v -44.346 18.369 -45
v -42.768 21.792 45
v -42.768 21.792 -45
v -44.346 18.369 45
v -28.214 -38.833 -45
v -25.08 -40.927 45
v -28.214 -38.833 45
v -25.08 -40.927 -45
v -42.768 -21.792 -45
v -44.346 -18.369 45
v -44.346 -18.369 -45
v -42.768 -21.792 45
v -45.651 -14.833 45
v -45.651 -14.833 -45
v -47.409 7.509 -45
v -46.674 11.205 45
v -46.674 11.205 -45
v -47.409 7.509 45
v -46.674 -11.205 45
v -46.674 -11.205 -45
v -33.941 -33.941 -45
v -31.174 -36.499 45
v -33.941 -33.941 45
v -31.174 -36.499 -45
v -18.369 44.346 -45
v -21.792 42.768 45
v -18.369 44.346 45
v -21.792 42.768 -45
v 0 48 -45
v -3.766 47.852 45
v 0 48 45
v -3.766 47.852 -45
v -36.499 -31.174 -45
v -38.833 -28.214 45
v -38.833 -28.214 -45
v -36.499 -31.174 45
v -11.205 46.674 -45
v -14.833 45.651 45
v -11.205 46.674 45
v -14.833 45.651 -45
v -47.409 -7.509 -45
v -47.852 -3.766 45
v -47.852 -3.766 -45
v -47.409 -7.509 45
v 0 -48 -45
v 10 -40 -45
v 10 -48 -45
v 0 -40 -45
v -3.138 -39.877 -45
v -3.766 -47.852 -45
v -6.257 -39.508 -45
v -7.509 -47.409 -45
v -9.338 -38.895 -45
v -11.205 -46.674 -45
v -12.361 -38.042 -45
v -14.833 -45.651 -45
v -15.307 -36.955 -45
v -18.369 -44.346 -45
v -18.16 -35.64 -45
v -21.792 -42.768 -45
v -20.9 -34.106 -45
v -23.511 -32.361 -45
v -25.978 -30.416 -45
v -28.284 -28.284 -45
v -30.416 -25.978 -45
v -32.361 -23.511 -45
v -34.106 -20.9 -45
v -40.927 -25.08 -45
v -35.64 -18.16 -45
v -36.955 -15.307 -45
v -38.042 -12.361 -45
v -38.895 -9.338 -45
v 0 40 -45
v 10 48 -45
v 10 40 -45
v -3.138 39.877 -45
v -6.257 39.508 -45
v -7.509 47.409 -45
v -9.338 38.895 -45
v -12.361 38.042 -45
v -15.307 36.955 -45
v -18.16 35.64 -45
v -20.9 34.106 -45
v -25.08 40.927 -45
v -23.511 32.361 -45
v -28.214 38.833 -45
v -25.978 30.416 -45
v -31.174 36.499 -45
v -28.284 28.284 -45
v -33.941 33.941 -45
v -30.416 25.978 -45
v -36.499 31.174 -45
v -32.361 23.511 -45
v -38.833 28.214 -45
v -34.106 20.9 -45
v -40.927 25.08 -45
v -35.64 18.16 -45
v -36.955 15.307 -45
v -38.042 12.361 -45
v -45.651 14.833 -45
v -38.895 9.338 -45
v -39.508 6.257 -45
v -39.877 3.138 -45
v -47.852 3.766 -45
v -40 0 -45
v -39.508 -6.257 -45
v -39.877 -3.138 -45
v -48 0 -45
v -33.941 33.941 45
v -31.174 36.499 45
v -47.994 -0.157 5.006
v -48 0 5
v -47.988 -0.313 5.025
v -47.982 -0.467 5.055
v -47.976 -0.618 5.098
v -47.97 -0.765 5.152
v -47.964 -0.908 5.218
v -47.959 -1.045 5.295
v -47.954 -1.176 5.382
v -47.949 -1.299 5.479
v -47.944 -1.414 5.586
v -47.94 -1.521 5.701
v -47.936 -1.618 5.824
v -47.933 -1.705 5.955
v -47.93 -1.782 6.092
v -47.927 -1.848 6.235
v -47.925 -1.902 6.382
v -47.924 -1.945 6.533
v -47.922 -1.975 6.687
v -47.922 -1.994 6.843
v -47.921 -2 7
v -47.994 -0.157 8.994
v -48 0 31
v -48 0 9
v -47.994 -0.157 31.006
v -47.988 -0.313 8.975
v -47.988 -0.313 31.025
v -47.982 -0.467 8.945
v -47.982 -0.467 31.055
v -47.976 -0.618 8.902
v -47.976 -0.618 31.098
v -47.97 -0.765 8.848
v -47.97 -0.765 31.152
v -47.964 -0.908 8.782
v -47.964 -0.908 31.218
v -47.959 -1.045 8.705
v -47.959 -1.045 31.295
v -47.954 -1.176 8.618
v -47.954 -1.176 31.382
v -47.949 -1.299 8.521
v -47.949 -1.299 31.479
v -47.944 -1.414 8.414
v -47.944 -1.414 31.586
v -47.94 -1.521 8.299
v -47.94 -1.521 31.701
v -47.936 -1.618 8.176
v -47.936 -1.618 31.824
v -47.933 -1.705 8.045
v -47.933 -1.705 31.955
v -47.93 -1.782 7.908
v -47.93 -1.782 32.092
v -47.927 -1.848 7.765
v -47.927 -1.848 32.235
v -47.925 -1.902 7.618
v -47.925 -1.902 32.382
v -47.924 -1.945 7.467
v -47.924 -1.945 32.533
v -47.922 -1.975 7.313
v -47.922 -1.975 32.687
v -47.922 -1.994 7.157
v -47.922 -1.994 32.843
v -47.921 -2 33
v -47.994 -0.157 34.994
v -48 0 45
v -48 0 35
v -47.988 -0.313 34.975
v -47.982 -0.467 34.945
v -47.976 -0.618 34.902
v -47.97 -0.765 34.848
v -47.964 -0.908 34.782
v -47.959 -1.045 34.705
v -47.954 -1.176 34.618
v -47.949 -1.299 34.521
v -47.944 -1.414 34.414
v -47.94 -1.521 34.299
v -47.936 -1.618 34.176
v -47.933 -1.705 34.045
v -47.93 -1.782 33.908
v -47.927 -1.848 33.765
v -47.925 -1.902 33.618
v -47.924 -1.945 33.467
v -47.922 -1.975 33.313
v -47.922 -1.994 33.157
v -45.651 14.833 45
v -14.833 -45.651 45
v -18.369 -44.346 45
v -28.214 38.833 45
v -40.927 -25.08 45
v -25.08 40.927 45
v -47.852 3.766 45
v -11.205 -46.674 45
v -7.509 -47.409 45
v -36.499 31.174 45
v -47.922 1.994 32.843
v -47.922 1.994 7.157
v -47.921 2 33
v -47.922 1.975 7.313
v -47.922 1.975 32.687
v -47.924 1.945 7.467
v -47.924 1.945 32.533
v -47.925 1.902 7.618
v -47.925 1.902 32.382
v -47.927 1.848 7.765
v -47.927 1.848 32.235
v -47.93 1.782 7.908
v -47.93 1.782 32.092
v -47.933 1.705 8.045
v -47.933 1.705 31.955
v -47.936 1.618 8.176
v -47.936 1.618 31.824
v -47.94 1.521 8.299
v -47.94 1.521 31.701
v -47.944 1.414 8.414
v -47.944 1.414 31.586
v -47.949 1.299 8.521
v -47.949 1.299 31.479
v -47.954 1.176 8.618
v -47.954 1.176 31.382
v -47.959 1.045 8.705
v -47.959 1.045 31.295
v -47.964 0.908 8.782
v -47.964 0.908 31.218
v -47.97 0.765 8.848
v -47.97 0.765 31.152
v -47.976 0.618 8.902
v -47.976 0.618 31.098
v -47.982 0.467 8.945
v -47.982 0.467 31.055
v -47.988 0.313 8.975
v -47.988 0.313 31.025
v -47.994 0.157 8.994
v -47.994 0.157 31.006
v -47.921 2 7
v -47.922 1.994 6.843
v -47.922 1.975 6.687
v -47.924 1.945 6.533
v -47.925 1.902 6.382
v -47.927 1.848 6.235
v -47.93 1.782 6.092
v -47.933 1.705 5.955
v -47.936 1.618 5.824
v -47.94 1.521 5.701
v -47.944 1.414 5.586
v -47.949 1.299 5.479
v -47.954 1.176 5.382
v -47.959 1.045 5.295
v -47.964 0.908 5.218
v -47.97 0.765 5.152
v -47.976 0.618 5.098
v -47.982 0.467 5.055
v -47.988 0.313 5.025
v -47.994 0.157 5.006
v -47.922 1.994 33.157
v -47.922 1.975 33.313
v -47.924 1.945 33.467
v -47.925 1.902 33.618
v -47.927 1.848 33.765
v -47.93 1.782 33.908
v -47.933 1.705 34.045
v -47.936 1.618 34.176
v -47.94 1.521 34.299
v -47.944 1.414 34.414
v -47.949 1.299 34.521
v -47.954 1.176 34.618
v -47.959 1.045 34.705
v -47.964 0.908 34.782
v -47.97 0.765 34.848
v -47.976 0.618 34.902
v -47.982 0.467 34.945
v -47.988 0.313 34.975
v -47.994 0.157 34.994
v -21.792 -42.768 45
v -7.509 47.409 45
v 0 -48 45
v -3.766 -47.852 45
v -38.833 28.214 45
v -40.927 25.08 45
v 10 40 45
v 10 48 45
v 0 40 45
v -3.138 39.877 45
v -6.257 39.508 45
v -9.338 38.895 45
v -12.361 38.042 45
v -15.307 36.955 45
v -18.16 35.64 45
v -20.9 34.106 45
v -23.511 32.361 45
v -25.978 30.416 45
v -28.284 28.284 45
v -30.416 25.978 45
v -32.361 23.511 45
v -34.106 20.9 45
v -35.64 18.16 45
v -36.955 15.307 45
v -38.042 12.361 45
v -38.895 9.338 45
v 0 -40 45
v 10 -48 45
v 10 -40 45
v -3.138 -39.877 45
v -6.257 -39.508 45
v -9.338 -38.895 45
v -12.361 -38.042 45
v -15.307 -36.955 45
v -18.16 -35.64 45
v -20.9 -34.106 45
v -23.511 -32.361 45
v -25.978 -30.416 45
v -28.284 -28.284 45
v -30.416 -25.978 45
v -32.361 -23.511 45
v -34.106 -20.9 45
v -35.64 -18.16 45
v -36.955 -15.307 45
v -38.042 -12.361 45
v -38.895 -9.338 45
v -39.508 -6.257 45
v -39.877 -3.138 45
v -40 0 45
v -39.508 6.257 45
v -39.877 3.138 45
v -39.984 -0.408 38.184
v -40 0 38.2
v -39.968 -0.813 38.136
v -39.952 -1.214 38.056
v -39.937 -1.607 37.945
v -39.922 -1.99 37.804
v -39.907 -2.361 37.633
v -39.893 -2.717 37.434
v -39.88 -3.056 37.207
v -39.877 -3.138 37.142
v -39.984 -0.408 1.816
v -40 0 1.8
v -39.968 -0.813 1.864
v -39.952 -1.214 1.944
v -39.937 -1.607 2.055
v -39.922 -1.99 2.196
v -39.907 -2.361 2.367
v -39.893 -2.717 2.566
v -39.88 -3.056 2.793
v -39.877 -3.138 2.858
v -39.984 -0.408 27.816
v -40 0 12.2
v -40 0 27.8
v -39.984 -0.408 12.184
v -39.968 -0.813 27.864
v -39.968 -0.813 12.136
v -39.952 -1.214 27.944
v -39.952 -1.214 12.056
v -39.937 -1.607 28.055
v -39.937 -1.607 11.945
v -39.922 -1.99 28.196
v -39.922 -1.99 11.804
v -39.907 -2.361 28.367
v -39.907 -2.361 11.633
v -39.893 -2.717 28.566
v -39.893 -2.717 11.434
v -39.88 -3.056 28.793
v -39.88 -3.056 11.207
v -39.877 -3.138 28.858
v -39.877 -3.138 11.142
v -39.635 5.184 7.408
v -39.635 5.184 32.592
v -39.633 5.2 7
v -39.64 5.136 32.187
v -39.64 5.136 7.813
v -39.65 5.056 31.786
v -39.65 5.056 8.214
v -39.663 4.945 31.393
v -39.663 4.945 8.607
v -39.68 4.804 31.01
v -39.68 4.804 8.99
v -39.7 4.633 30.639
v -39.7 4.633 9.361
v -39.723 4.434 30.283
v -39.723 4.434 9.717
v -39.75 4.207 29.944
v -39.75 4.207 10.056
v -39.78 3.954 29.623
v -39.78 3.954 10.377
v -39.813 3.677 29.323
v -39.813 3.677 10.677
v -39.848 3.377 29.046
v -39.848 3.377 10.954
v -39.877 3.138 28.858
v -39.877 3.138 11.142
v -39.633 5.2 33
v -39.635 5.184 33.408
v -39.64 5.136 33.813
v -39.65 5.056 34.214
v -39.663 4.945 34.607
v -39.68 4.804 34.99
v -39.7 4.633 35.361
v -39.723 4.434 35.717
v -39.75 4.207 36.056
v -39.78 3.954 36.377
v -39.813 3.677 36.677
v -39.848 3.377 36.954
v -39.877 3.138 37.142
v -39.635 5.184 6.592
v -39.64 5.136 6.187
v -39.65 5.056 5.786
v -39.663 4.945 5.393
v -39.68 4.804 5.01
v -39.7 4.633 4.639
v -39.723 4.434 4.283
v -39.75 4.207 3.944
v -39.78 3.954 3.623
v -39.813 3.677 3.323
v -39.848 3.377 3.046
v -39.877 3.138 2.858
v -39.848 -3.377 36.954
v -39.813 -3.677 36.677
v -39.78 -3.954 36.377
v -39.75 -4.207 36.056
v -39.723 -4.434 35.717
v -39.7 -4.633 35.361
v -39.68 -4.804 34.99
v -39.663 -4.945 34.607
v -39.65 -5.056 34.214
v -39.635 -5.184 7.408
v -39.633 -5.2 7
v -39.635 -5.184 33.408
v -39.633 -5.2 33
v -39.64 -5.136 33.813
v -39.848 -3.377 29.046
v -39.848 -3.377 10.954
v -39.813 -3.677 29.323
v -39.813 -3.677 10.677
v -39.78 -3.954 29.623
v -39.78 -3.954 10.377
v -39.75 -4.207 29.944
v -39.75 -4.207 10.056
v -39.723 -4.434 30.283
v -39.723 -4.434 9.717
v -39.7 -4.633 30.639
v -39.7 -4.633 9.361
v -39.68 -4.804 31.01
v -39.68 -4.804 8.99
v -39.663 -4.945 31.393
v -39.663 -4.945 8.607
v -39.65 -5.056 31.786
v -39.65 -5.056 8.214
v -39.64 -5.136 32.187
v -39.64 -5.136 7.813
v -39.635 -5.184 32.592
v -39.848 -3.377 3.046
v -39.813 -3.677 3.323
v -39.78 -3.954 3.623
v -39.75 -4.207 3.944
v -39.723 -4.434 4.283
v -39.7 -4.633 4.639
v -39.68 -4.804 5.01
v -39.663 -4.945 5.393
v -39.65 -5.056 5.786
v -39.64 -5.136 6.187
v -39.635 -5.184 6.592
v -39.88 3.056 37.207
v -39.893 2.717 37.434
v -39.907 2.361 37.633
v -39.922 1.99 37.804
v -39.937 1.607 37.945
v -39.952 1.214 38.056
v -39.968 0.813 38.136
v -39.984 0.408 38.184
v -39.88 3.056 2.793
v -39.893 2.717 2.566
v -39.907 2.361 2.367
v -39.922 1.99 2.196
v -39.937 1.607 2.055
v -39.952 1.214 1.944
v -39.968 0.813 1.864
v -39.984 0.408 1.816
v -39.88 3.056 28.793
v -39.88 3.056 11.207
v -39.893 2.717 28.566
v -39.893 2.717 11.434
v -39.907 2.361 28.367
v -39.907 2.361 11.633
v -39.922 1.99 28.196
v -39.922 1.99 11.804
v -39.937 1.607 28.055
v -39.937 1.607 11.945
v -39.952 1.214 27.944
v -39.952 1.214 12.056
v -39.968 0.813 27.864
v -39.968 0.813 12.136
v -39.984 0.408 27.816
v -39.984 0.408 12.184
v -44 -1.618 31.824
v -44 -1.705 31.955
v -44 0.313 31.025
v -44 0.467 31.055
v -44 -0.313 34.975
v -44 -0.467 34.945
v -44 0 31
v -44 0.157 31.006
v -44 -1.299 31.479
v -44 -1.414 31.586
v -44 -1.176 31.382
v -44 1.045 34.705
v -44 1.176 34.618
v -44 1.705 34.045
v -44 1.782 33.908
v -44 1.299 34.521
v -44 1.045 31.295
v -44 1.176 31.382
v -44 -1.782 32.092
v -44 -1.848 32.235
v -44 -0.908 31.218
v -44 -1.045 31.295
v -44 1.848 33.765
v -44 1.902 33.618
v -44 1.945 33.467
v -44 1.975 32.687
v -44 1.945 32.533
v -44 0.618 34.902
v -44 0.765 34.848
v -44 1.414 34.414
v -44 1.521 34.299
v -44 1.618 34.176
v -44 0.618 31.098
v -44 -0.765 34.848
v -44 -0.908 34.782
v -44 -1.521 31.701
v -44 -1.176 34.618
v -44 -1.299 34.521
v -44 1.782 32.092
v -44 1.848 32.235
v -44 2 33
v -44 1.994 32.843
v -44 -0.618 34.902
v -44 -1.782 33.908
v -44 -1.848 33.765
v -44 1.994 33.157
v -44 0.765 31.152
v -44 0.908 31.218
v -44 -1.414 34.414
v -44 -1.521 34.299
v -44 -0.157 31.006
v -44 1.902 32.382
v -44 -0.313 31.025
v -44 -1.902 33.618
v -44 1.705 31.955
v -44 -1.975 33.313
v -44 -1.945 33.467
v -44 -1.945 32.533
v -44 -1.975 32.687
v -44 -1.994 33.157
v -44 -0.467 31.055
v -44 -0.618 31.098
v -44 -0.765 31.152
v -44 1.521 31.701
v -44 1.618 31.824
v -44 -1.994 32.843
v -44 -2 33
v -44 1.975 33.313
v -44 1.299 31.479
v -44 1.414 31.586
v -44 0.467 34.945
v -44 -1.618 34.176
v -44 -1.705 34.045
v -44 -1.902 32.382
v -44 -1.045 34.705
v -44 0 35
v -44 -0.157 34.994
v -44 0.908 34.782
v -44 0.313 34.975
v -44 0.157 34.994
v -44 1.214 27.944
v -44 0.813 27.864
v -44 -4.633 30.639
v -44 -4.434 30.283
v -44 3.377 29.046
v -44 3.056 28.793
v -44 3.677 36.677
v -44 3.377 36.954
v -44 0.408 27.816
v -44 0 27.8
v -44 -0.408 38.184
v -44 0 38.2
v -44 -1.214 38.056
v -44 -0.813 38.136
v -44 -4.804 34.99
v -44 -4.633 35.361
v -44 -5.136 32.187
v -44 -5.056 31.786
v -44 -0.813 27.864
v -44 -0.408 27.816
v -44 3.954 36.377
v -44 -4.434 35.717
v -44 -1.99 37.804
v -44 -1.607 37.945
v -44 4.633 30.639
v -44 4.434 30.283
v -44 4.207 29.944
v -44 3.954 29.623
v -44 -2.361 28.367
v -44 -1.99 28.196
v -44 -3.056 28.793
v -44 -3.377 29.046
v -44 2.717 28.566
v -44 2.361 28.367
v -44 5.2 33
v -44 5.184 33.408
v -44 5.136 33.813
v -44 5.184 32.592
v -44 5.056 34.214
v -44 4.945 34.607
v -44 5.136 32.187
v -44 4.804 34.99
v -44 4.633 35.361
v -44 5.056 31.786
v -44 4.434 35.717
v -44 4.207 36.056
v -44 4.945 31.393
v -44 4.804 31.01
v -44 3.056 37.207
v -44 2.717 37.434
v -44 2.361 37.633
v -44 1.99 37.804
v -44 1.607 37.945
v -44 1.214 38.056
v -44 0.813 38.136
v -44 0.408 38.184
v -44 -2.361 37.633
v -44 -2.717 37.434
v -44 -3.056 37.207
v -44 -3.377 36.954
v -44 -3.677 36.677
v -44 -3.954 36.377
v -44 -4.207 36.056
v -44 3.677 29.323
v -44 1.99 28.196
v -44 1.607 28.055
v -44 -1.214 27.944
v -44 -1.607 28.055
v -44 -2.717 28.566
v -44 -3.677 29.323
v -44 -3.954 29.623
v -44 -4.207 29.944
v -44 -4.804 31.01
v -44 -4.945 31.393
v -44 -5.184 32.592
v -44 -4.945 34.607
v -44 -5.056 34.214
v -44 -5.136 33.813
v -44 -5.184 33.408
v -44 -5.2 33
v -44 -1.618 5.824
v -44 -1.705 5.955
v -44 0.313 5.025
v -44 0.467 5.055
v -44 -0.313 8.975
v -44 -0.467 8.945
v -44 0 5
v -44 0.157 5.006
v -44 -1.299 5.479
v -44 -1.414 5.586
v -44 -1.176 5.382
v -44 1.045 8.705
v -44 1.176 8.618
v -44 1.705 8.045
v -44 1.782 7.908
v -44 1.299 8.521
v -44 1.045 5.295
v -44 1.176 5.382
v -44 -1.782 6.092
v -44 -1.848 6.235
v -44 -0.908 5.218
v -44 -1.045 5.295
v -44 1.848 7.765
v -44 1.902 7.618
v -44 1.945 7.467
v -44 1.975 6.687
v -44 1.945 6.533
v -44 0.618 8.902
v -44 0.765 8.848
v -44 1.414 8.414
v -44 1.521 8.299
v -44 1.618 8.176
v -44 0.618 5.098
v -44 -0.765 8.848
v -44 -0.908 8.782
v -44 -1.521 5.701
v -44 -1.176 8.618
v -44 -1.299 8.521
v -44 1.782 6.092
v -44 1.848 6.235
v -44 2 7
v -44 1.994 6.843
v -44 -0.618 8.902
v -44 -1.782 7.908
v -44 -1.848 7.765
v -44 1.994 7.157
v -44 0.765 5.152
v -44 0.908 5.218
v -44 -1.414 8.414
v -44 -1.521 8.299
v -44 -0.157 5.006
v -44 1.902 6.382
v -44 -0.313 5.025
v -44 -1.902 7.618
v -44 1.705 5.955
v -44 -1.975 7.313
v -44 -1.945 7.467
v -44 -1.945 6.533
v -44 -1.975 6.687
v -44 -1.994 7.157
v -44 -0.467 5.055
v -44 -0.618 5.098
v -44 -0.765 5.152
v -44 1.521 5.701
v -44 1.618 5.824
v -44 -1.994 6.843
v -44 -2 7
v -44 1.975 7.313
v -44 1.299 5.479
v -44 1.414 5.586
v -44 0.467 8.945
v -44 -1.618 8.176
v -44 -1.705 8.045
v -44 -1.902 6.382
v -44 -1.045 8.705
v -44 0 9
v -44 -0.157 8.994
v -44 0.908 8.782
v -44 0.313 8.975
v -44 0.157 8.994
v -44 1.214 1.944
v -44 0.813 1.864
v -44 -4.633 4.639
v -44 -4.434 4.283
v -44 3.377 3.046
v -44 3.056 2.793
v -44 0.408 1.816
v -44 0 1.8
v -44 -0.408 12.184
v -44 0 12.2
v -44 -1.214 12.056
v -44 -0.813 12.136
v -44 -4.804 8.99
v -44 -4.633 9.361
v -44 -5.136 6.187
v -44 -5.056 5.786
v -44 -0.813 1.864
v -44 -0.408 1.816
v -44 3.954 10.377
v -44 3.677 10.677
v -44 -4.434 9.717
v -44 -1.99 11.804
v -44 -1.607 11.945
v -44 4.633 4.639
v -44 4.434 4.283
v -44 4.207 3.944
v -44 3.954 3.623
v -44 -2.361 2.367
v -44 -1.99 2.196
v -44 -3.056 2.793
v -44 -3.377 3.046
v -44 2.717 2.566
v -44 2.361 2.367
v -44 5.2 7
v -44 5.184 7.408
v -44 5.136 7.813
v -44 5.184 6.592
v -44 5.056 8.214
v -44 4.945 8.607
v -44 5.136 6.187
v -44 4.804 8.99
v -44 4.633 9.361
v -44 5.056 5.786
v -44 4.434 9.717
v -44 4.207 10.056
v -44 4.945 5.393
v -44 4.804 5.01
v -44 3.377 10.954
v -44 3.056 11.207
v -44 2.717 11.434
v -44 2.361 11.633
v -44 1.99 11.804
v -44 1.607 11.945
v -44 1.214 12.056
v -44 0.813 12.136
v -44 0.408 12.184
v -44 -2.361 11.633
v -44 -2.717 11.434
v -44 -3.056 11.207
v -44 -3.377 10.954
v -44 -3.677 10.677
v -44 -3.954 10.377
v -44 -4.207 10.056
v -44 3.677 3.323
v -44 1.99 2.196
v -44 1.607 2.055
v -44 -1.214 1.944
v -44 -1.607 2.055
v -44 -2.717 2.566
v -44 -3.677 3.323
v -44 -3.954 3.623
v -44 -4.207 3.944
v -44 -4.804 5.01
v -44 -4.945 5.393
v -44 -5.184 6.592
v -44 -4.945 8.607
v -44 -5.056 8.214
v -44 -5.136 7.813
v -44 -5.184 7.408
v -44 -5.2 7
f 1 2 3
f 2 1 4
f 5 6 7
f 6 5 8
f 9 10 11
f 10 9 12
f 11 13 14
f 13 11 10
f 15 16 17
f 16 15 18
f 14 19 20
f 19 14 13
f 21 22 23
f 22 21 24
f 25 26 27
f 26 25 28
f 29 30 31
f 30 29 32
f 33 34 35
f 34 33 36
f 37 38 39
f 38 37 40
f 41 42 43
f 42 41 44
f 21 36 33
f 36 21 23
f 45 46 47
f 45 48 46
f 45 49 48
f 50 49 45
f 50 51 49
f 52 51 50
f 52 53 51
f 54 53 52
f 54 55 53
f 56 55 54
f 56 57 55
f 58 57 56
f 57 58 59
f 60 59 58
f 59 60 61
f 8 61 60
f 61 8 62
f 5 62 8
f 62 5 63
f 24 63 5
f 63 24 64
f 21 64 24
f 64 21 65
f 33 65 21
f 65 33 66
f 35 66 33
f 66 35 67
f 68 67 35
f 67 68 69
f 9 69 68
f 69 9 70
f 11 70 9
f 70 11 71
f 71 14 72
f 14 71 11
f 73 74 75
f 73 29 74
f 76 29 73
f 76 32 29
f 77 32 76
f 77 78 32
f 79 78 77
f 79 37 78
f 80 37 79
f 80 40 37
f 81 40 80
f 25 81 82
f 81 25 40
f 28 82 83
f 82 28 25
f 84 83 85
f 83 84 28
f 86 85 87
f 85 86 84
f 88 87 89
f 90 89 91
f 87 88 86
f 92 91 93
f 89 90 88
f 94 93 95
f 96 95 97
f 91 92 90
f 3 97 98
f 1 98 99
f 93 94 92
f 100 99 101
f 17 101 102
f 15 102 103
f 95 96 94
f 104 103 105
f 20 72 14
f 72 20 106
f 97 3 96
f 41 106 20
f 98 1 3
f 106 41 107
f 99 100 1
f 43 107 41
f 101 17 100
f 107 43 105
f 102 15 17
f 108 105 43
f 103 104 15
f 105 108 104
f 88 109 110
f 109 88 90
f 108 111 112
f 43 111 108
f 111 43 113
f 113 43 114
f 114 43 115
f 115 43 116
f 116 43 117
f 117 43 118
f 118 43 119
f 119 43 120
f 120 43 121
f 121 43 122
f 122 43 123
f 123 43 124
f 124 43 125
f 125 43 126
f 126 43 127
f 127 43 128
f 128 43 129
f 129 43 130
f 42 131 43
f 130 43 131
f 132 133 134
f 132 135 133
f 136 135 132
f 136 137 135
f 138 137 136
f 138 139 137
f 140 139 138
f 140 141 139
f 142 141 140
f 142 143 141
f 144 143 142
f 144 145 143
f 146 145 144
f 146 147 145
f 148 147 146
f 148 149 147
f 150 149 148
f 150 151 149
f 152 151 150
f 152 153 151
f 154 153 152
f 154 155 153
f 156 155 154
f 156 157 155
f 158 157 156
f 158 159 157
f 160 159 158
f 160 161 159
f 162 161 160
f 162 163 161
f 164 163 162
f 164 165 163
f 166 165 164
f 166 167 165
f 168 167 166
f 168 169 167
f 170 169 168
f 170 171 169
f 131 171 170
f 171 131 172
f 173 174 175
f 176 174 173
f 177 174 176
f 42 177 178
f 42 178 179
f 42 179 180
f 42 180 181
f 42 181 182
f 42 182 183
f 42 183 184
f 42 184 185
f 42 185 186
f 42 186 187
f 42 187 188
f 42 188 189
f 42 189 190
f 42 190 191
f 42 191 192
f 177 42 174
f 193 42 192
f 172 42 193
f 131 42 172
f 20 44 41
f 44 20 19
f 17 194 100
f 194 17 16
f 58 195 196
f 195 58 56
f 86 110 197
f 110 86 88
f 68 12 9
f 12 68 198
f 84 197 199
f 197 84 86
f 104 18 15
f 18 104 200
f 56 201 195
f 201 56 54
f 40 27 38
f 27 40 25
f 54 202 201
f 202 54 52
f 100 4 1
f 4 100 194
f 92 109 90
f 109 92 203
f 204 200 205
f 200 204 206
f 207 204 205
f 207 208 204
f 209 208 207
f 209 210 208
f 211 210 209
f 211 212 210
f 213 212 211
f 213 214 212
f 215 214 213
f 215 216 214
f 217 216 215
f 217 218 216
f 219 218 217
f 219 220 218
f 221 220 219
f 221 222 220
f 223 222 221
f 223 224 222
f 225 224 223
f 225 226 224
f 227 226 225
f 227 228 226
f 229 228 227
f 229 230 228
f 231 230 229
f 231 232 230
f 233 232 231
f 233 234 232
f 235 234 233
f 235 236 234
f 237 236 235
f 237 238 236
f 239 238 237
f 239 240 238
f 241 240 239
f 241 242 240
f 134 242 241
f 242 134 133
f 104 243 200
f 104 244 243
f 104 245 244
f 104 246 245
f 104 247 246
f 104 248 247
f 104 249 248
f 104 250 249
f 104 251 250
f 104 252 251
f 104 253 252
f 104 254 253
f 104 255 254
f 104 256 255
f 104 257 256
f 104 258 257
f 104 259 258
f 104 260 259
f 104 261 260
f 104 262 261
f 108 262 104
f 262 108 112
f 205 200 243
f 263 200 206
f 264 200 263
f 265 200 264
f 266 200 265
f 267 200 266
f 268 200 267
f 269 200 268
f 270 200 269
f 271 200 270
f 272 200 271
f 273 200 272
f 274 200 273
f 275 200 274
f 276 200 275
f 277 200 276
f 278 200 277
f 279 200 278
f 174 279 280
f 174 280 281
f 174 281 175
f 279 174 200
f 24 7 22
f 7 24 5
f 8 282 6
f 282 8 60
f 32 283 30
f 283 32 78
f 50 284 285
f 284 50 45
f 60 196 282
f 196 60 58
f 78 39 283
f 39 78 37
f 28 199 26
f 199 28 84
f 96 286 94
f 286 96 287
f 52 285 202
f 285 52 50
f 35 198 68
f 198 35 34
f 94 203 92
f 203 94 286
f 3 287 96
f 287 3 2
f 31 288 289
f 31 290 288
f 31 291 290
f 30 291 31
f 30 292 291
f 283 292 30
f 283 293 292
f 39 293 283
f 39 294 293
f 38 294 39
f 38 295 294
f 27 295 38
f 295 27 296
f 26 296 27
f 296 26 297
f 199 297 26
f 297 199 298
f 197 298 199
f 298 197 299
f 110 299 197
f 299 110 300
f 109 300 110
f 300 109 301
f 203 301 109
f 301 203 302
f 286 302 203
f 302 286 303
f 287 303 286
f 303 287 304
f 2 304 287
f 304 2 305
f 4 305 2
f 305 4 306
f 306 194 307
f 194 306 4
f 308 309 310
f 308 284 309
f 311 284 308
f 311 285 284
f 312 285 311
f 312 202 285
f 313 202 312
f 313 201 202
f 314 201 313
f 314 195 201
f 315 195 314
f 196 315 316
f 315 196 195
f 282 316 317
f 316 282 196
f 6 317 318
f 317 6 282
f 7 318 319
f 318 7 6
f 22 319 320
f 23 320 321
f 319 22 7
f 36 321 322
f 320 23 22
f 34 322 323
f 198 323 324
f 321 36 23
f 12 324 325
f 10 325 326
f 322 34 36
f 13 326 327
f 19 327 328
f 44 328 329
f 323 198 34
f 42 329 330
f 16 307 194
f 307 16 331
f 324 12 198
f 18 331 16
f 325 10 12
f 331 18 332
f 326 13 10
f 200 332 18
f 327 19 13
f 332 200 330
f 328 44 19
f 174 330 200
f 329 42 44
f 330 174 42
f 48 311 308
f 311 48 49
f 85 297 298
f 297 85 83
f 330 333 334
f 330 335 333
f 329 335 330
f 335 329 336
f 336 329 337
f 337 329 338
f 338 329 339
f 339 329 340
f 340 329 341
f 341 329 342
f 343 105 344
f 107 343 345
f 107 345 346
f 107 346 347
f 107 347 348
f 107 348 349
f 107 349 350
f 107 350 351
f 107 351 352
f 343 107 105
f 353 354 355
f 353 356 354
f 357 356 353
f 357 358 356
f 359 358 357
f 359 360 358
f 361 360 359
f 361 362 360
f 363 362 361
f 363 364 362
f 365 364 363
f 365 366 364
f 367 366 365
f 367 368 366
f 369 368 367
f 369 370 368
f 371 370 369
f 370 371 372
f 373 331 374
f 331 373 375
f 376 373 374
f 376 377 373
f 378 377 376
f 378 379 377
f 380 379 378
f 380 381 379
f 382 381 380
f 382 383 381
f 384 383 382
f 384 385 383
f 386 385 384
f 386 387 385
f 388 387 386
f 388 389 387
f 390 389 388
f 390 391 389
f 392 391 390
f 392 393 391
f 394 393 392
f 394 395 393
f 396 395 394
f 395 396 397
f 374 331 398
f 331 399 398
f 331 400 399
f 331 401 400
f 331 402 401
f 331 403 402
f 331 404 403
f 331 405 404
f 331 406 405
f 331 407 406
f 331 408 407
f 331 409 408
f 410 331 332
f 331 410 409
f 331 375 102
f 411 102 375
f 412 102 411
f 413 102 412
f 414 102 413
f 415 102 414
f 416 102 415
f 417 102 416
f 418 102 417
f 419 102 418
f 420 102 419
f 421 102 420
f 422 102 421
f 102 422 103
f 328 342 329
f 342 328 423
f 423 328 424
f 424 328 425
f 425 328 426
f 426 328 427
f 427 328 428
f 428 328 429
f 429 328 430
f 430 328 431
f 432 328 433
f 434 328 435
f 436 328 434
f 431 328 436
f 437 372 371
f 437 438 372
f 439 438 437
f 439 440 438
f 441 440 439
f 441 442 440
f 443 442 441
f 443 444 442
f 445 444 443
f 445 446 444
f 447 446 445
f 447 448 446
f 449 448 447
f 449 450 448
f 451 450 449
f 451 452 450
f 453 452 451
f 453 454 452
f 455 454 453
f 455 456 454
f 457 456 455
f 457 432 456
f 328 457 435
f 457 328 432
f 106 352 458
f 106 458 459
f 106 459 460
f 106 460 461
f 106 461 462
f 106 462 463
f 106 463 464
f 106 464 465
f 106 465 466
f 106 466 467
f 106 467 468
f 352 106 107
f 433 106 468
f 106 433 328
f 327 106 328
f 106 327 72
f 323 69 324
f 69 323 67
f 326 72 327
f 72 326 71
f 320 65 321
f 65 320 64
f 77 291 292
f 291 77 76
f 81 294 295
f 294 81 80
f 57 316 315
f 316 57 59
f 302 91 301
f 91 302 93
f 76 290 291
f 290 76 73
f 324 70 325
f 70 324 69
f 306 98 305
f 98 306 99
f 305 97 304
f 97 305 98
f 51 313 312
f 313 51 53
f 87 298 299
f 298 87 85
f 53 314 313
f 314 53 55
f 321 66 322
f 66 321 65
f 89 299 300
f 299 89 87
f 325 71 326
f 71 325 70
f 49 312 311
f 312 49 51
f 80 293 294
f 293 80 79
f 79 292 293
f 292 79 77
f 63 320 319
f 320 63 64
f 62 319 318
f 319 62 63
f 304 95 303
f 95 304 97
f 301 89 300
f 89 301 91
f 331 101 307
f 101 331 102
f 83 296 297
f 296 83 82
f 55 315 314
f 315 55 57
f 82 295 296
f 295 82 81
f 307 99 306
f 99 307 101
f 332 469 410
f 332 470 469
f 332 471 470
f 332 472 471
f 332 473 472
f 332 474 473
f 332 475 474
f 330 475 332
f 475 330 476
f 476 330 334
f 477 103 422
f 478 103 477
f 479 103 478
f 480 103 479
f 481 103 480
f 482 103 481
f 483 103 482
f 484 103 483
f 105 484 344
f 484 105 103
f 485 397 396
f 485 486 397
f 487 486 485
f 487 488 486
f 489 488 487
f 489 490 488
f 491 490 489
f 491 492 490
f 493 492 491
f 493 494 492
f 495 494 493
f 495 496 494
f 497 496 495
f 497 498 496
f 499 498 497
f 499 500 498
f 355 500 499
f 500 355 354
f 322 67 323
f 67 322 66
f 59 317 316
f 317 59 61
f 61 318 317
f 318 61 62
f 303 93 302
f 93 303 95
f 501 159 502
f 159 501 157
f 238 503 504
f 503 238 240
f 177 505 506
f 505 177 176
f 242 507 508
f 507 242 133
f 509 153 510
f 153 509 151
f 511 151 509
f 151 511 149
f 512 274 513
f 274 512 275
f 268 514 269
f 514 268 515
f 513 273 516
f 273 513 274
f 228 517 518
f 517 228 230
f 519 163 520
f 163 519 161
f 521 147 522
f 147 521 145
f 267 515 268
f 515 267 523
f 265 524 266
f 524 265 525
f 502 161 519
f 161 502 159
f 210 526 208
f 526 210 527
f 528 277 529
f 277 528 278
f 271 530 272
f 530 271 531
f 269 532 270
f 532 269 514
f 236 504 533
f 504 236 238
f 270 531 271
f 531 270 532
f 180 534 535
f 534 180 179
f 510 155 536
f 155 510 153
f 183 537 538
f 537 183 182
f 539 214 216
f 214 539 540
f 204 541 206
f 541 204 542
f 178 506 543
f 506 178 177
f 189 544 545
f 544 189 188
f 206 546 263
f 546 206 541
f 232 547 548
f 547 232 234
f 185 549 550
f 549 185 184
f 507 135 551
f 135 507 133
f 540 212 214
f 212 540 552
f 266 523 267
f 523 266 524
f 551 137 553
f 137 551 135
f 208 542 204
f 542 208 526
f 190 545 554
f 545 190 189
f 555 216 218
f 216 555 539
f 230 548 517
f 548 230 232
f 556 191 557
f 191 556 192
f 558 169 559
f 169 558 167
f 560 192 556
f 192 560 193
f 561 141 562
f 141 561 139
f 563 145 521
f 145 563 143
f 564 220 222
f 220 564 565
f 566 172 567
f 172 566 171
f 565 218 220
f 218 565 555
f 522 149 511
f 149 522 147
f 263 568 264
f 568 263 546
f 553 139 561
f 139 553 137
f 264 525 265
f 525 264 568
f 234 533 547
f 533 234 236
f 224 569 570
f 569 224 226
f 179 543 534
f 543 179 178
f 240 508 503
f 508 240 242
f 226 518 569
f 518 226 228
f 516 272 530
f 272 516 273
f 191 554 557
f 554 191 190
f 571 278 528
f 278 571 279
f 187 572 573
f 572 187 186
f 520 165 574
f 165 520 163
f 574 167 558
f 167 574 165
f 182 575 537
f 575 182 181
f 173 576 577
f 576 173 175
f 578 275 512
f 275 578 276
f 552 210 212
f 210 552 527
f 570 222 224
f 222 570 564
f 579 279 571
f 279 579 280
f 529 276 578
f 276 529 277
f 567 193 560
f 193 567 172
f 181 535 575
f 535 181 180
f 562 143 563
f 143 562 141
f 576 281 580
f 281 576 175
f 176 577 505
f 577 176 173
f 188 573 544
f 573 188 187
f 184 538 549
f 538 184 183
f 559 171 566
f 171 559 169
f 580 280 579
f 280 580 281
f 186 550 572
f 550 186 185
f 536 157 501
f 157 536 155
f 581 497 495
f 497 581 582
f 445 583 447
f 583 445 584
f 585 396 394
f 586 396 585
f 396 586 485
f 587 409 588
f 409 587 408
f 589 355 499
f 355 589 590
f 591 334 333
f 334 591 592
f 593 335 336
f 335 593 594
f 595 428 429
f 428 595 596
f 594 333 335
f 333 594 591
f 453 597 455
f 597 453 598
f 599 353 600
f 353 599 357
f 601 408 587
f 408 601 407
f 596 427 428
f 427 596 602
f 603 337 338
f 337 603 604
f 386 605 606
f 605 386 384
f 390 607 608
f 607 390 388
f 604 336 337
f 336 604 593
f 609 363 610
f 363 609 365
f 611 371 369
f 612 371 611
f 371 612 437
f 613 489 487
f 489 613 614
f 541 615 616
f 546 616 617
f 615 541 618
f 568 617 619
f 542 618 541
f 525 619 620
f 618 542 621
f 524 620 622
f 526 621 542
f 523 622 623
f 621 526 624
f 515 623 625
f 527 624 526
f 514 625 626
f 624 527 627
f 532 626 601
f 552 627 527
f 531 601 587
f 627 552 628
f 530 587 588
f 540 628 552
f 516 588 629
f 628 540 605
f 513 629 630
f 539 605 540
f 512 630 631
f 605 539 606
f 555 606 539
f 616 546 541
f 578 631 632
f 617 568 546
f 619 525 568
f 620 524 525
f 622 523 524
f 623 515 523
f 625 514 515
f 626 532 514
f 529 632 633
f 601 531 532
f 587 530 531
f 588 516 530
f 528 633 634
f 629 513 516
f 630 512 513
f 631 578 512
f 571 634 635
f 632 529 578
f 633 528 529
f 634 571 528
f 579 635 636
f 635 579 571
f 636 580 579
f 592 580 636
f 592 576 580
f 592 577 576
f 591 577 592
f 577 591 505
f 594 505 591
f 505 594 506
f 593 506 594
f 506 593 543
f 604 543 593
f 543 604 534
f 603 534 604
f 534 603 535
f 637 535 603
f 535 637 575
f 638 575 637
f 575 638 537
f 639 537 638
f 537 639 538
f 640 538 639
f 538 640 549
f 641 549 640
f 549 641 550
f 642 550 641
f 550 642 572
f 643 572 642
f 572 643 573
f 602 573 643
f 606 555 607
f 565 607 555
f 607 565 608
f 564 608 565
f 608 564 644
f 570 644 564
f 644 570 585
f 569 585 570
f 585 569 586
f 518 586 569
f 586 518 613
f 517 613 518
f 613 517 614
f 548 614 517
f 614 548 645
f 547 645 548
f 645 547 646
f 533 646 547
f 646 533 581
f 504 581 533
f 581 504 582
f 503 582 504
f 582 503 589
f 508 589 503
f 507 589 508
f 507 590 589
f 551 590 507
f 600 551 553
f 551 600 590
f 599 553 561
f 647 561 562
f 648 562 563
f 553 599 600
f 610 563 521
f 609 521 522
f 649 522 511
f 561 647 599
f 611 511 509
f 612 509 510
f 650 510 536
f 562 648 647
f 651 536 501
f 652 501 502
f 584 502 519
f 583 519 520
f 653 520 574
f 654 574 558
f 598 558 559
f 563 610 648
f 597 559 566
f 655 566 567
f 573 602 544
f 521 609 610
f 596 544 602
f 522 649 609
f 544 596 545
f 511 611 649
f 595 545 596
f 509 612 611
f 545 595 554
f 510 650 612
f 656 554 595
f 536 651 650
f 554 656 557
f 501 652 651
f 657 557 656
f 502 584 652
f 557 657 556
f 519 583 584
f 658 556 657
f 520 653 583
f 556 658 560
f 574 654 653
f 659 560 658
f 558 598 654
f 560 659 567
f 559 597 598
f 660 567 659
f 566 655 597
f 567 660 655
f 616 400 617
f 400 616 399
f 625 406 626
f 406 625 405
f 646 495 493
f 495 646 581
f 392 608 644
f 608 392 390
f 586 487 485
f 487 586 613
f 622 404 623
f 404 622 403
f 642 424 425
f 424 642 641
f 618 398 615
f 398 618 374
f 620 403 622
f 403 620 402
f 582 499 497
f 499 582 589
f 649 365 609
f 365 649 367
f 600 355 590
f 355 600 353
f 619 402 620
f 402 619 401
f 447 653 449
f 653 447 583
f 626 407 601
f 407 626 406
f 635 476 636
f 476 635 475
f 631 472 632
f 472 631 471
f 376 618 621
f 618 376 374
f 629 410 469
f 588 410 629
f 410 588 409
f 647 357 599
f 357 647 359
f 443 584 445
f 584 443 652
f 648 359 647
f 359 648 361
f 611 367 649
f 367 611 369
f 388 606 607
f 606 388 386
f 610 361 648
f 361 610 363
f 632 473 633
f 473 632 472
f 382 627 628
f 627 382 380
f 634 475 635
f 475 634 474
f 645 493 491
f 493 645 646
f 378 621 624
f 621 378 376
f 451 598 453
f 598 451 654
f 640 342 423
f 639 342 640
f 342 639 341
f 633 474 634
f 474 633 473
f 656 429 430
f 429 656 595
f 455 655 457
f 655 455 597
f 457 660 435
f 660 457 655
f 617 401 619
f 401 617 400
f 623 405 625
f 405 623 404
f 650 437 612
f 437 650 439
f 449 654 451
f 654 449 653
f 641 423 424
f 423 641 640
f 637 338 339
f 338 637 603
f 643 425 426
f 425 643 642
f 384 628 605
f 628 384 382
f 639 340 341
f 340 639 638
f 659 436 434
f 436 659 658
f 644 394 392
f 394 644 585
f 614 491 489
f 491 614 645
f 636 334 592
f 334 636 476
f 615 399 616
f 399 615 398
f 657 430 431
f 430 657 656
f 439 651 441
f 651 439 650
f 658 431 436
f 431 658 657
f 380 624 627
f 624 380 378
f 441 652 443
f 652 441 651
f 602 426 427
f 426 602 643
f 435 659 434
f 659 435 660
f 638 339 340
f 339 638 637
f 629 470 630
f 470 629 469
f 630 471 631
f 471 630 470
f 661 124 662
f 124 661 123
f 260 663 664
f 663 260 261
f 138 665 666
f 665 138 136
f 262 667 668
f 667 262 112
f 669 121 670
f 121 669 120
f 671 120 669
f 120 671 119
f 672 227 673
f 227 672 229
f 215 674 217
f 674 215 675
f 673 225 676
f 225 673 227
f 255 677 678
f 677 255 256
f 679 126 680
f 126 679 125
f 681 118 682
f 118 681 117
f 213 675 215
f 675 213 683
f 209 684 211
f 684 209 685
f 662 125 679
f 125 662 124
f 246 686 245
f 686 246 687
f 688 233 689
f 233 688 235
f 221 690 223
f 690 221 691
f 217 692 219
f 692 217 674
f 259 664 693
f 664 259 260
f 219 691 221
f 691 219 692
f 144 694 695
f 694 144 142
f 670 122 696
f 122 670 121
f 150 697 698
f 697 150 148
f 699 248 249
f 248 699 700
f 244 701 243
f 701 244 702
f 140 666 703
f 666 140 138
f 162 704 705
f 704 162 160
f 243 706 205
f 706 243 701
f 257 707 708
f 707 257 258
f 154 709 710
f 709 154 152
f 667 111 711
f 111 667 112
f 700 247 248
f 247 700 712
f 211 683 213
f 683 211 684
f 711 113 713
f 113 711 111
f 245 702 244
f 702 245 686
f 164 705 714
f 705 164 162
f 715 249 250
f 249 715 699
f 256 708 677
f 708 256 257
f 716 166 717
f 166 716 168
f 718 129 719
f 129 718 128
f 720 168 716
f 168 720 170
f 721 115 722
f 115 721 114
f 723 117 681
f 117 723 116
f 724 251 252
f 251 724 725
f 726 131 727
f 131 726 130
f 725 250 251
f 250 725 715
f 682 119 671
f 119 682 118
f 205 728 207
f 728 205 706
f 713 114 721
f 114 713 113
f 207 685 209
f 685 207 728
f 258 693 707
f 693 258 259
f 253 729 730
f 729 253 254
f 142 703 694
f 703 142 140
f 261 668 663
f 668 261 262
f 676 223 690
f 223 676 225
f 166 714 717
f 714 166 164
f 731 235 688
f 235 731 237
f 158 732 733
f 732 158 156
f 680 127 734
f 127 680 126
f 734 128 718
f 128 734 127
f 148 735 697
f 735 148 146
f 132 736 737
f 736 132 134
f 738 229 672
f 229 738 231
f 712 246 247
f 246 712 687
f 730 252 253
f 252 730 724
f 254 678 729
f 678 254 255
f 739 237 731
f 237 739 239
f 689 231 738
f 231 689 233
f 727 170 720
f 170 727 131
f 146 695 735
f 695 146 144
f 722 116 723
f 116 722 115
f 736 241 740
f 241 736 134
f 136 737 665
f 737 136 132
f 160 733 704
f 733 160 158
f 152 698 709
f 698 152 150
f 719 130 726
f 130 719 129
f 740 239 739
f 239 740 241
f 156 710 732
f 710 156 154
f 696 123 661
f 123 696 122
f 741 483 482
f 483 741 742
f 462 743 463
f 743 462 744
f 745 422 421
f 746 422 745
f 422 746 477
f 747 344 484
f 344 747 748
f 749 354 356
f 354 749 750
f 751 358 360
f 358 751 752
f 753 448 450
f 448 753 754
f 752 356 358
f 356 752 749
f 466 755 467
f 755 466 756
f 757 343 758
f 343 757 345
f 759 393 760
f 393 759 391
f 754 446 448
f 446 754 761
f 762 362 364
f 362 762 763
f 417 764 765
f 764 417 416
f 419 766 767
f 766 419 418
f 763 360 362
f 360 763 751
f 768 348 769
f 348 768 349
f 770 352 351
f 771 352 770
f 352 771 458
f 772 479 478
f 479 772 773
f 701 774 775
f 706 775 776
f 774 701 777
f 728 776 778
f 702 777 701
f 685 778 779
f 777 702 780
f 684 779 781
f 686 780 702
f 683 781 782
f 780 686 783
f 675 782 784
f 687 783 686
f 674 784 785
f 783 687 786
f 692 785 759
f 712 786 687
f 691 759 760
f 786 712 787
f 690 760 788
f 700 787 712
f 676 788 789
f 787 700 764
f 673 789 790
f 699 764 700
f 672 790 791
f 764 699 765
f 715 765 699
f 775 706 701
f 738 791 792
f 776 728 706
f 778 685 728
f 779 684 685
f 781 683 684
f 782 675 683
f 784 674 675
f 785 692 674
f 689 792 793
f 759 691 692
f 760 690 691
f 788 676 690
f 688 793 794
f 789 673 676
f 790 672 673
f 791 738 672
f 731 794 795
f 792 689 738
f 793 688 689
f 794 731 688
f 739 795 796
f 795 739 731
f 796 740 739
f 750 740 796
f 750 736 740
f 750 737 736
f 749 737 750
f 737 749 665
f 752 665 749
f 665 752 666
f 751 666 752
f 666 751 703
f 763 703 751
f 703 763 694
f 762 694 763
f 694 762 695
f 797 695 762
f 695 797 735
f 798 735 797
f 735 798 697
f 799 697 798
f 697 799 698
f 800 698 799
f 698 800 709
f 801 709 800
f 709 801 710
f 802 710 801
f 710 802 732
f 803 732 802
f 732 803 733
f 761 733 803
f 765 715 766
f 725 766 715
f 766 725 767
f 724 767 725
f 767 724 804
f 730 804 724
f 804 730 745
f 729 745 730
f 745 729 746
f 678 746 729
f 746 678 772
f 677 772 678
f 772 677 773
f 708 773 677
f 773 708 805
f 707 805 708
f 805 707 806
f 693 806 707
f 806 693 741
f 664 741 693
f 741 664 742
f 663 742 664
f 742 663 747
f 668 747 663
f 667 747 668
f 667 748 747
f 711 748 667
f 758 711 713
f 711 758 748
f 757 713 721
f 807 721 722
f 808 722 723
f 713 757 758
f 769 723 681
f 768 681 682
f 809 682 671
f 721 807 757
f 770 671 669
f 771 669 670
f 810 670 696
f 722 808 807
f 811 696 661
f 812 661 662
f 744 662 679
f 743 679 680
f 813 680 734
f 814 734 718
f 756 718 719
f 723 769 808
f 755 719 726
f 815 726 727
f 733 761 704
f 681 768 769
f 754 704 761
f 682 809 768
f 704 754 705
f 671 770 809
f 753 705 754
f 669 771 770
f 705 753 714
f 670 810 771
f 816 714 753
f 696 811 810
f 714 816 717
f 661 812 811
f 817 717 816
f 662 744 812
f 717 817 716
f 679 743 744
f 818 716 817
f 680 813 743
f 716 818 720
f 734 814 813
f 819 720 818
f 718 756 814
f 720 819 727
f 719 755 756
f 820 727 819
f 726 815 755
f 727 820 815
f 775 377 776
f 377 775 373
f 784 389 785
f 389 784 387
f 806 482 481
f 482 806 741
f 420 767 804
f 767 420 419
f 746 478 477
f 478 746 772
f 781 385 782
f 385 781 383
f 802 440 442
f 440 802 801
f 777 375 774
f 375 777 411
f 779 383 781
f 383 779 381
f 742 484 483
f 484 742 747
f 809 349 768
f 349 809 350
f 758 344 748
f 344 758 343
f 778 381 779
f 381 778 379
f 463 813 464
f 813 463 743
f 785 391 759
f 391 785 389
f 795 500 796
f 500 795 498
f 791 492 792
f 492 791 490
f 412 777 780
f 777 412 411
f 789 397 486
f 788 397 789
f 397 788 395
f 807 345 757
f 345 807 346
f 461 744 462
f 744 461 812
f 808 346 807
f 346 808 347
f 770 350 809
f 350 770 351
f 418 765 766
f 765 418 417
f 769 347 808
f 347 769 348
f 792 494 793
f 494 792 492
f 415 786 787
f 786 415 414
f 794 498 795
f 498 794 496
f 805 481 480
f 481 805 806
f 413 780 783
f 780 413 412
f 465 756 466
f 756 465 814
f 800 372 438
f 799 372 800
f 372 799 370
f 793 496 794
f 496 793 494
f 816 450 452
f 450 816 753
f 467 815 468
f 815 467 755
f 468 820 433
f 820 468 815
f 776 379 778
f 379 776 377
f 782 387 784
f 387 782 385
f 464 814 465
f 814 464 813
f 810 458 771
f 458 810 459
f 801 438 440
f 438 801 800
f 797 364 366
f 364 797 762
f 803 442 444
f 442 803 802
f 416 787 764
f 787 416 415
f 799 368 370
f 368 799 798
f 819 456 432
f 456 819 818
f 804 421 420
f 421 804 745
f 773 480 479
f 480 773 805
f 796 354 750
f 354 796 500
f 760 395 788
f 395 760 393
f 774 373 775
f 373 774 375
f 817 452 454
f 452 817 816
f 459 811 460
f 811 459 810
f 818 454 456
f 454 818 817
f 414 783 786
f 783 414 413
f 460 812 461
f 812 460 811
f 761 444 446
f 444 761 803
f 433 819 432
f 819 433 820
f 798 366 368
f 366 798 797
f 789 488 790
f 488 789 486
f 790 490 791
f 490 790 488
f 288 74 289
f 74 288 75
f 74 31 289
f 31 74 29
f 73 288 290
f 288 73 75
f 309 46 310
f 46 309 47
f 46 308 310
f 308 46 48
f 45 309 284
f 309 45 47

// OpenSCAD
// Ariel Burman
// Instituto de Ingeniería Biomédica
// Universidad de Buenos Aires

espesor=8;
diam=80;
height=90;
lenght=40;

screwd=4;
screwsep=26;
screwdes=20;
$fn=80;

sidewall=10;

difference() {
  cylinder(h=height,d=diam+espesor*2,center=true);
  cylinder(h=height+1,d=diam,center=true);
  translate([(diam+espesor+1)/2,0,0])cube([diam+espesor+1,diam+espesor*2+1,height+1],center=true);

  translate([-(diam+espesor)/2,0,screwsep/2+screwdes])rotate([0,90,0])cylinder(h=espesor+1,d=screwd,center=true);
  translate([-(diam-1)/2,0,screwsep/2+screwdes])rotate([0,90,0])cylinder(h=espesor+1,d=screwd*2.6,center=true);

  translate([-(diam+espesor)/2,0,-screwsep/2+screwdes])rotate([0,90,0])cylinder(h=espesor+1,d=screwd,center=true);
  translate([-(diam-1)/2,0,-screwsep/2+screwdes])rotate([0,90,0])cylinder(h=espesor+1,d=screwd*2.6,center=true);
}

translate([sidewall/2,(diam+espesor)/2,0])cube([sidewall,espesor,height],center=true);
translate([sidewall/2,-(diam+espesor)/2,0])cube([sidewall,espesor,height],center=true);
